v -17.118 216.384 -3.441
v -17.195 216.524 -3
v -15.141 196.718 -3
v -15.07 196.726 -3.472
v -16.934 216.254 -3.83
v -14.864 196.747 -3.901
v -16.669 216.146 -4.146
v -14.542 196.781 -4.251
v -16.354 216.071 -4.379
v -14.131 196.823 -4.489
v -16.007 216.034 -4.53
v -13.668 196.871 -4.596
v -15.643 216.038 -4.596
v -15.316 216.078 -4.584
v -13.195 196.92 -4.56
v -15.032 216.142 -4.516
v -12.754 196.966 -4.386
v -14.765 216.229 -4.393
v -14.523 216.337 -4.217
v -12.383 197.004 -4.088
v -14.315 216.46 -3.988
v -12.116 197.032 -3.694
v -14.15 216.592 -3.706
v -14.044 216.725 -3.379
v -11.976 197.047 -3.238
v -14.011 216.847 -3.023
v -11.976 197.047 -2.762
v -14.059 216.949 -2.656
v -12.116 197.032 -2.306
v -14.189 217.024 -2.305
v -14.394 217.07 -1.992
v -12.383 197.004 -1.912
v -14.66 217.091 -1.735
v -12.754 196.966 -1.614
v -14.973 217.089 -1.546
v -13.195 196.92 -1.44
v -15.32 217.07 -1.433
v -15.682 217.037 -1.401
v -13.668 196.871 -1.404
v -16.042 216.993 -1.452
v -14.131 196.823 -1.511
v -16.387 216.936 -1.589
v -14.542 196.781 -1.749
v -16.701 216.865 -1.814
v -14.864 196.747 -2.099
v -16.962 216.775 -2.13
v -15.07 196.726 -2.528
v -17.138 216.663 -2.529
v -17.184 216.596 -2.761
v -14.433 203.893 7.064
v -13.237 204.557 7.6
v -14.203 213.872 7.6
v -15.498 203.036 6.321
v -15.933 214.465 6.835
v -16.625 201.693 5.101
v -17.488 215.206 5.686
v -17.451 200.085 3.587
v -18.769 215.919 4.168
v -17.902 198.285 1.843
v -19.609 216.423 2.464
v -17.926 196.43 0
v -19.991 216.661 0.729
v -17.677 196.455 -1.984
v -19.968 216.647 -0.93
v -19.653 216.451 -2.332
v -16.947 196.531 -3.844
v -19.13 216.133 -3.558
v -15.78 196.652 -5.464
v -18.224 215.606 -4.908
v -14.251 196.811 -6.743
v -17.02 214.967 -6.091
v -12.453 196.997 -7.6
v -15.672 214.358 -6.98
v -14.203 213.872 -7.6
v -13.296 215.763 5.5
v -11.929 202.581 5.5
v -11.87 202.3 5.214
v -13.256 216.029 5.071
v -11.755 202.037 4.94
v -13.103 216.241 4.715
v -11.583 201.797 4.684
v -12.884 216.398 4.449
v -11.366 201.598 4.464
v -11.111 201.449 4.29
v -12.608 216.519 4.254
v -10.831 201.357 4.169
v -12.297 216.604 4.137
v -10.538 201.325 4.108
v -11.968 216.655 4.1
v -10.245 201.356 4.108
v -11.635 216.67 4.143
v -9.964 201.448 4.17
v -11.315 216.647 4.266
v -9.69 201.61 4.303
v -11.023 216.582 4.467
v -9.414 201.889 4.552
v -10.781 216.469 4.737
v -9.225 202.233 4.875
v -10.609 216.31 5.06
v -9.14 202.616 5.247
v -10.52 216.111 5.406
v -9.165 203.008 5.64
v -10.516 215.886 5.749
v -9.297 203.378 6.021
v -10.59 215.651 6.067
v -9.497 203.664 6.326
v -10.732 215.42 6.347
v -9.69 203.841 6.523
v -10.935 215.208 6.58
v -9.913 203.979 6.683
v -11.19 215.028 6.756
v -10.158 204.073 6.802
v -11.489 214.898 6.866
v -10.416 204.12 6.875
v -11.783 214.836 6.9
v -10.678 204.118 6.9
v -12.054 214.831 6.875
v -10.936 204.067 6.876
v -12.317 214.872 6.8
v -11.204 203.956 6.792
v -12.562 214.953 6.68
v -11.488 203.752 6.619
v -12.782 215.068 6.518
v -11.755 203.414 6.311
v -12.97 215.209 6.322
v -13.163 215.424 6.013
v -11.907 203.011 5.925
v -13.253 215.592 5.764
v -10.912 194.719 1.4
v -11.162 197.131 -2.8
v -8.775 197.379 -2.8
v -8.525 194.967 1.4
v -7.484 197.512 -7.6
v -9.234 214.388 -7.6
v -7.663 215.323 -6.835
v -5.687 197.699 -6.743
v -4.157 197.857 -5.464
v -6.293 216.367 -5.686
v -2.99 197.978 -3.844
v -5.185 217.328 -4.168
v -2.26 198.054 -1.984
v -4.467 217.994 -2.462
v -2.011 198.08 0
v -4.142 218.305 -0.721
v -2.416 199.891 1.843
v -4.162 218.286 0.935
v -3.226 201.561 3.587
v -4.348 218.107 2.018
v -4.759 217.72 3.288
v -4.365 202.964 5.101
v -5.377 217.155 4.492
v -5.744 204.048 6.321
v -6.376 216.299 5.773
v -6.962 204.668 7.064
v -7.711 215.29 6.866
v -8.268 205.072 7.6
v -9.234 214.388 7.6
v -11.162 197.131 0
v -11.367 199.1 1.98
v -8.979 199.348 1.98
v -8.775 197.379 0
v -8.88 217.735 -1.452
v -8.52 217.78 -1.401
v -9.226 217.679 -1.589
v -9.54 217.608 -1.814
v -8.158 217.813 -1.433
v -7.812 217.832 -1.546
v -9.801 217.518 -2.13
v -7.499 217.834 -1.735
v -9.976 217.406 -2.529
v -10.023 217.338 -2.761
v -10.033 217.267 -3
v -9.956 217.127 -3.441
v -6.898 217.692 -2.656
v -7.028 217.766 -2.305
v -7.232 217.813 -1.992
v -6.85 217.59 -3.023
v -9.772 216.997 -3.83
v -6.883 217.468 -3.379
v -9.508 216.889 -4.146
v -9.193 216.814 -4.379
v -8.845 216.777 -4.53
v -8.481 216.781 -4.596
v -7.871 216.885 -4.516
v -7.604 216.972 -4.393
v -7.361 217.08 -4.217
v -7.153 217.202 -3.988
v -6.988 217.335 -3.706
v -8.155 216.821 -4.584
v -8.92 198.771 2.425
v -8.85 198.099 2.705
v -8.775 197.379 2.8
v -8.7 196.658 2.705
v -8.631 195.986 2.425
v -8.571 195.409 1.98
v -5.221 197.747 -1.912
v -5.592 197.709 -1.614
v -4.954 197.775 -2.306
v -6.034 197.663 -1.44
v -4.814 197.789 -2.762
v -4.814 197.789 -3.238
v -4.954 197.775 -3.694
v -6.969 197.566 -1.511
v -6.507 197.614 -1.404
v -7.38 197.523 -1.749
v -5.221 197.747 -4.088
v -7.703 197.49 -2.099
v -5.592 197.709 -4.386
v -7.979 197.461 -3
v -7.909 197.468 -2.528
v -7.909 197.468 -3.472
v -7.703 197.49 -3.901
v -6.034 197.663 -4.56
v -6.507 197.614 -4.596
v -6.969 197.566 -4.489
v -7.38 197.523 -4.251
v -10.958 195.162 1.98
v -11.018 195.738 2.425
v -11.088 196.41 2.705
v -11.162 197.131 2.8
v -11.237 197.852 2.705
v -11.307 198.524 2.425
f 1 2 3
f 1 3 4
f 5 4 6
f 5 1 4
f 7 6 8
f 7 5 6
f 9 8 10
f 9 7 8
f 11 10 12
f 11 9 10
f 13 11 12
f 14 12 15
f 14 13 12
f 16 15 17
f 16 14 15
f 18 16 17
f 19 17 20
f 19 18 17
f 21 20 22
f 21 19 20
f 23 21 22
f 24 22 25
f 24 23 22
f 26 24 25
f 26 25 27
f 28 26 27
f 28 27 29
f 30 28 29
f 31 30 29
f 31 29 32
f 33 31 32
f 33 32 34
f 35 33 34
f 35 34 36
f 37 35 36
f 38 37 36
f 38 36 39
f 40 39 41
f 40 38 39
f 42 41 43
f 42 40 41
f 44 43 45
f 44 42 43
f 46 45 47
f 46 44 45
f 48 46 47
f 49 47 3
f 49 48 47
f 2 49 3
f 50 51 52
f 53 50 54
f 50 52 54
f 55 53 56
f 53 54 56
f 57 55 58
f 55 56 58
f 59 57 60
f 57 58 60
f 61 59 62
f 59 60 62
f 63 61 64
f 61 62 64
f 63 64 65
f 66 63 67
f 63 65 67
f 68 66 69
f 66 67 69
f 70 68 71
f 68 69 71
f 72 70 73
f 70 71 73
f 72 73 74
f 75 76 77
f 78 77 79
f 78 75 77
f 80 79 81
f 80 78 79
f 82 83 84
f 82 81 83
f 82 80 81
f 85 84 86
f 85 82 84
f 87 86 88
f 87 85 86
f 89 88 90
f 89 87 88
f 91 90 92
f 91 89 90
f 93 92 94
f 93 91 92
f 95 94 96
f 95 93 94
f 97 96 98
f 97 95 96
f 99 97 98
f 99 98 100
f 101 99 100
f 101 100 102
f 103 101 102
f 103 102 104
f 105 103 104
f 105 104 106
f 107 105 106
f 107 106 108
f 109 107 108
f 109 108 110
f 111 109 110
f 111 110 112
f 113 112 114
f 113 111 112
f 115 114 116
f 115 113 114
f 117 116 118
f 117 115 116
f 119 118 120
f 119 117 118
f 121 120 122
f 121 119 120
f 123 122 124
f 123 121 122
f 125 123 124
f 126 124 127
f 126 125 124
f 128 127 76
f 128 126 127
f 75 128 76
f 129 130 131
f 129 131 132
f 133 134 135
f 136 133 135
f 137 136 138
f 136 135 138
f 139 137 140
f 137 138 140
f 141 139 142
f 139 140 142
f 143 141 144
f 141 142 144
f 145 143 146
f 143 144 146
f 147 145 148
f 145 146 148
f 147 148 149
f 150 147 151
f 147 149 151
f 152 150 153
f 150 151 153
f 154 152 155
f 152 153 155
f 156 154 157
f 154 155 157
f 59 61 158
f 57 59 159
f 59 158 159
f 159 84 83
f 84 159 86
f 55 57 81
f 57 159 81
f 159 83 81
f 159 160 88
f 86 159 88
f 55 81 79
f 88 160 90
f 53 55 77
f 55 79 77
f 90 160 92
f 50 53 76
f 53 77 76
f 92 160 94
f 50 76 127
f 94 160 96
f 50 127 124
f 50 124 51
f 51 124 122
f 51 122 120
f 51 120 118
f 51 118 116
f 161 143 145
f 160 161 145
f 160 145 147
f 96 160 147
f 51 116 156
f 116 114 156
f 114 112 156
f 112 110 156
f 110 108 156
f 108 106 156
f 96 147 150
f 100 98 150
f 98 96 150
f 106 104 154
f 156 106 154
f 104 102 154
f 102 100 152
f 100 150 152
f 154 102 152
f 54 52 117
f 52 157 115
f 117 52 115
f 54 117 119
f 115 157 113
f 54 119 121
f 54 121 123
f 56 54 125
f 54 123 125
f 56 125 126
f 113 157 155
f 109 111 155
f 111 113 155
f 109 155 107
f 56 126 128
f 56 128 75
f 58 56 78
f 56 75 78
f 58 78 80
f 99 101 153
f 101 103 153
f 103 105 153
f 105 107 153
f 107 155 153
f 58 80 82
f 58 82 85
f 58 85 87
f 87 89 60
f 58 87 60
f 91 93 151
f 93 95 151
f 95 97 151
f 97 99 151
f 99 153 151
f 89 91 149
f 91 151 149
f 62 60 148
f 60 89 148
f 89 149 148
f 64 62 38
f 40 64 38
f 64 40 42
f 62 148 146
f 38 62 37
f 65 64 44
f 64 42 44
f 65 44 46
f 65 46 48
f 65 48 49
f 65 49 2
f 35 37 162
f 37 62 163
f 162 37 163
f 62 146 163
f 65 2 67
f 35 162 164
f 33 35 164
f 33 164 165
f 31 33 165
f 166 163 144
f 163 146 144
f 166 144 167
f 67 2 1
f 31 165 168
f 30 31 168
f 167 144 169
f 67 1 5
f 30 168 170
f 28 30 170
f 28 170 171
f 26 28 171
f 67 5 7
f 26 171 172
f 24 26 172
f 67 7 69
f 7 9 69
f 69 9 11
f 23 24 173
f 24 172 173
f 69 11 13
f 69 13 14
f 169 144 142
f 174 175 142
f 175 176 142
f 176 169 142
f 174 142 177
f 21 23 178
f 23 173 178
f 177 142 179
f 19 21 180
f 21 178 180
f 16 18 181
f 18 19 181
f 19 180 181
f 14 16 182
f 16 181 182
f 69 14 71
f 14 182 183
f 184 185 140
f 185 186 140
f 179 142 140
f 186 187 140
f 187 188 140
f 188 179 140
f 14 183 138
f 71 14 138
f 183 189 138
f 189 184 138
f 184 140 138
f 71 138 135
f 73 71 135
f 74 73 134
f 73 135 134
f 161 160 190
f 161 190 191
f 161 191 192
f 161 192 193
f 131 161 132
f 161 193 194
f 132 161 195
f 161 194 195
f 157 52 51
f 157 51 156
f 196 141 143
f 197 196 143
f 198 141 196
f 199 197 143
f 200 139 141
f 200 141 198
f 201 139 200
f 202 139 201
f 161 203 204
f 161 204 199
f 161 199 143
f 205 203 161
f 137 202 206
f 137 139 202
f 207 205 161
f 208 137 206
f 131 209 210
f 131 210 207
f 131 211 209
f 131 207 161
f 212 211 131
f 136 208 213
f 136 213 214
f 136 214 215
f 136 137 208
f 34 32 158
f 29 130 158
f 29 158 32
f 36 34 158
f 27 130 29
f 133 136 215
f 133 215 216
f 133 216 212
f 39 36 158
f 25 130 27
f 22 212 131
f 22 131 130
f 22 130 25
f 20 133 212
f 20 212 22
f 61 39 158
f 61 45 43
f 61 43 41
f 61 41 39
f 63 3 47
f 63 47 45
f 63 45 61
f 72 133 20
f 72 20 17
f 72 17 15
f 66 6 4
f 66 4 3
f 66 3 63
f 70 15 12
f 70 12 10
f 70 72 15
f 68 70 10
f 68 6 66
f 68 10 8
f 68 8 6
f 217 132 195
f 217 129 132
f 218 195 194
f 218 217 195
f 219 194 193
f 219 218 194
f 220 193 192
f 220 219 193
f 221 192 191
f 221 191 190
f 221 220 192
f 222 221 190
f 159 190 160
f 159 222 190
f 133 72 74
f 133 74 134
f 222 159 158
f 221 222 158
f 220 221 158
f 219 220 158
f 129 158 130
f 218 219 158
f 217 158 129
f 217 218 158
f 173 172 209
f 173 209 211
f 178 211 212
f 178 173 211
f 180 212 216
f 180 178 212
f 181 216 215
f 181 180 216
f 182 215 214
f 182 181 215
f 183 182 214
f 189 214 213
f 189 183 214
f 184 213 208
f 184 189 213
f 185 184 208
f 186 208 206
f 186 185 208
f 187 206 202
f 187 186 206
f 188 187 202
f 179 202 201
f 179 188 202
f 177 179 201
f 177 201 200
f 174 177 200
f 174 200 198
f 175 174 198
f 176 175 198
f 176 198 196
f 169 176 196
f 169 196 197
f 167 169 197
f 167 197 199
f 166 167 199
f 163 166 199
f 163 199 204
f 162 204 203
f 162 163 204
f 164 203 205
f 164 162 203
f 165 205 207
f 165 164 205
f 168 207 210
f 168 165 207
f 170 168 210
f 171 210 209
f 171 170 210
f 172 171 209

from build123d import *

# Parameters (mm, degrees)
SKETCH3_R               = 8
BOSS_EXTRUDE1_DEPTH     = 20.490526316
CUT_EXTRUDE1_DEPTH      = 11.102334007
CUT_EXTRUDE1_DEPTH_BACK = 11.102334007
CUT_EXTRUDE2_DEPTH      = 11.089230335
CUT_EXTRUDE2_DEPTH_BACK = 11.089230335
BOSS_EXTRUDE3_DEPTH     = 1.2
SKETCH8_R               = 1.6
SKETCH8_R_2             = 1.4
CUT_EXTRUDE3_DEPTH      = 24.833519451
CUT_EXTRUDE3_DEPTH_BACK = 2.513887999
CUT_EXTRUDE4_DEPTH      = 23.004414315


with BuildPart() as part:
    # Sketch3 → Boss-Extrude1 (new body)
    with BuildSketch(Plane(origin=(-12.082314344, 217.636022384, 0), x_dir=(-0.994665758, -0.103150523, 0), z_dir=(0.103150523, -0.994665758, 0))):
        Circle(SKETCH3_R)
    extrude(amount=BOSS_EXTRUDE1_DEPTH)

    # Sketch4 → Cut-Extrude1 (cut, two sides)
    with BuildSketch(Plane(origin=(10.375761543, 1.076004901, 0), x_dir=(0.103150523, -0.994665758, 0), z_dir=(-0.994665758, -0.103150523, 0))) as cut_extrude1_sk:
        with BuildLine():
            Line((-217.721396158, 8), (-213.721396158, 8))
            ThreePointArc((-213.721396158, 8), (-217.59367935, 0), (-213.721396158, -8))
            Line((-213.721396158, -8), (-217.721396158, -8))
            Line((-217.721396158, -8), (-217.721396158, 8))
        make_face()
    extrude(amount=CUT_EXTRUDE1_DEPTH, mode=Mode.SUBTRACT)
    extrude(cut_extrude1_sk.sketch, amount=-CUT_EXTRUDE1_DEPTH_BACK, mode=Mode.SUBTRACT)

    # Sketch5 → Cut-Extrude2 (cut, two sides)
    with BuildSketch(Plane(origin=(10.375761543, 1.076004901, 0), x_dir=(0.103150523, -0.994665758, 0), z_dir=(-0.994665758, -0.103150523, 0))) as cut_extrude2_sk:
        Polygon((-197.230869842, 0), (-205.230869842, 8), (-197.230869842, 8), align=None)
    extrude(amount=CUT_EXTRUDE2_DEPTH, mode=Mode.SUBTRACT)
    extrude(cut_extrude2_sk.sketch, amount=-CUT_EXTRUDE2_DEPTH_BACK, mode=Mode.SUBTRACT)

    # Sketch7 → Boss-Extrude3 (add, symmetric)
    with BuildSketch(Plane(origin=(10.375761543, 1.076004901, 0), x_dir=(0.103150523, -0.994665758, 0), z_dir=(-0.994665758, -0.103150523, 0))):
        with BuildLine():
            Line((-199.210768829, 1.979898987), (-197.230869842, 0))
            Line((-197.230869842, 0), (-197.230869842, -2.8))
            Line((-197.230869842, -2.8), (-194.805998711, 1.4))
            ThreePointArc((-194.805998711, 1.4), (-196.865396504, 2.776045612), (-199.210768829, 1.979898987))
        make_face()
    extrude(amount=BOSS_EXTRUDE3_DEPTH, both=True)

    # Sketch8 → Cut-Extrude3 (cut, two sides)
    with BuildSketch(Plane(origin=(-12.082314344, 217.636022384, 0), x_dir=(-0.994665758, -0.103150523, 0), z_dir=(0.103150523, -0.994665758, 0))) as cut_extrude3_sk:
        with Locations((-3.6, 3)):
            Circle(SKETCH8_R)
        with Locations((3.6, 3)):
            Circle(SKETCH8_R)
        with Locations((0, -5.5)):
            Circle(SKETCH8_R_2)
    extrude(amount=CUT_EXTRUDE3_DEPTH, mode=Mode.SUBTRACT)
    extrude(cut_extrude3_sk.sketch, amount=-CUT_EXTRUDE3_DEPTH_BACK, mode=Mode.SUBTRACT)

    # Sketch9 → Cut-Extrude4 (cut, through all)
    with BuildSketch(Plane(origin=(-20.344467381, 196.178792599, 0), x_dir=(0.994665758, 0.103150523, 0), z_dir=(0.103150523, -0.994665758, 0))):
        with BuildLine():
            Line((7.933405986, -7.6), (12.929404385, -7.6))
            ThreePointArc((12.929404385, -7.6), (10.431405186, -8), (7.933405986, -7.6))
        make_face()
        with BuildLine():
            Line((7.933405986, 7.6), (12.929404385, 7.6))
            ThreePointArc((12.929404385, 7.6), (10.431405186, 8), (7.933405986, 7.6))
        make_face()
    extrude(amount=-CUT_EXTRUDE4_DEPTH, mode=Mode.SUBTRACT)


solid = part.part
